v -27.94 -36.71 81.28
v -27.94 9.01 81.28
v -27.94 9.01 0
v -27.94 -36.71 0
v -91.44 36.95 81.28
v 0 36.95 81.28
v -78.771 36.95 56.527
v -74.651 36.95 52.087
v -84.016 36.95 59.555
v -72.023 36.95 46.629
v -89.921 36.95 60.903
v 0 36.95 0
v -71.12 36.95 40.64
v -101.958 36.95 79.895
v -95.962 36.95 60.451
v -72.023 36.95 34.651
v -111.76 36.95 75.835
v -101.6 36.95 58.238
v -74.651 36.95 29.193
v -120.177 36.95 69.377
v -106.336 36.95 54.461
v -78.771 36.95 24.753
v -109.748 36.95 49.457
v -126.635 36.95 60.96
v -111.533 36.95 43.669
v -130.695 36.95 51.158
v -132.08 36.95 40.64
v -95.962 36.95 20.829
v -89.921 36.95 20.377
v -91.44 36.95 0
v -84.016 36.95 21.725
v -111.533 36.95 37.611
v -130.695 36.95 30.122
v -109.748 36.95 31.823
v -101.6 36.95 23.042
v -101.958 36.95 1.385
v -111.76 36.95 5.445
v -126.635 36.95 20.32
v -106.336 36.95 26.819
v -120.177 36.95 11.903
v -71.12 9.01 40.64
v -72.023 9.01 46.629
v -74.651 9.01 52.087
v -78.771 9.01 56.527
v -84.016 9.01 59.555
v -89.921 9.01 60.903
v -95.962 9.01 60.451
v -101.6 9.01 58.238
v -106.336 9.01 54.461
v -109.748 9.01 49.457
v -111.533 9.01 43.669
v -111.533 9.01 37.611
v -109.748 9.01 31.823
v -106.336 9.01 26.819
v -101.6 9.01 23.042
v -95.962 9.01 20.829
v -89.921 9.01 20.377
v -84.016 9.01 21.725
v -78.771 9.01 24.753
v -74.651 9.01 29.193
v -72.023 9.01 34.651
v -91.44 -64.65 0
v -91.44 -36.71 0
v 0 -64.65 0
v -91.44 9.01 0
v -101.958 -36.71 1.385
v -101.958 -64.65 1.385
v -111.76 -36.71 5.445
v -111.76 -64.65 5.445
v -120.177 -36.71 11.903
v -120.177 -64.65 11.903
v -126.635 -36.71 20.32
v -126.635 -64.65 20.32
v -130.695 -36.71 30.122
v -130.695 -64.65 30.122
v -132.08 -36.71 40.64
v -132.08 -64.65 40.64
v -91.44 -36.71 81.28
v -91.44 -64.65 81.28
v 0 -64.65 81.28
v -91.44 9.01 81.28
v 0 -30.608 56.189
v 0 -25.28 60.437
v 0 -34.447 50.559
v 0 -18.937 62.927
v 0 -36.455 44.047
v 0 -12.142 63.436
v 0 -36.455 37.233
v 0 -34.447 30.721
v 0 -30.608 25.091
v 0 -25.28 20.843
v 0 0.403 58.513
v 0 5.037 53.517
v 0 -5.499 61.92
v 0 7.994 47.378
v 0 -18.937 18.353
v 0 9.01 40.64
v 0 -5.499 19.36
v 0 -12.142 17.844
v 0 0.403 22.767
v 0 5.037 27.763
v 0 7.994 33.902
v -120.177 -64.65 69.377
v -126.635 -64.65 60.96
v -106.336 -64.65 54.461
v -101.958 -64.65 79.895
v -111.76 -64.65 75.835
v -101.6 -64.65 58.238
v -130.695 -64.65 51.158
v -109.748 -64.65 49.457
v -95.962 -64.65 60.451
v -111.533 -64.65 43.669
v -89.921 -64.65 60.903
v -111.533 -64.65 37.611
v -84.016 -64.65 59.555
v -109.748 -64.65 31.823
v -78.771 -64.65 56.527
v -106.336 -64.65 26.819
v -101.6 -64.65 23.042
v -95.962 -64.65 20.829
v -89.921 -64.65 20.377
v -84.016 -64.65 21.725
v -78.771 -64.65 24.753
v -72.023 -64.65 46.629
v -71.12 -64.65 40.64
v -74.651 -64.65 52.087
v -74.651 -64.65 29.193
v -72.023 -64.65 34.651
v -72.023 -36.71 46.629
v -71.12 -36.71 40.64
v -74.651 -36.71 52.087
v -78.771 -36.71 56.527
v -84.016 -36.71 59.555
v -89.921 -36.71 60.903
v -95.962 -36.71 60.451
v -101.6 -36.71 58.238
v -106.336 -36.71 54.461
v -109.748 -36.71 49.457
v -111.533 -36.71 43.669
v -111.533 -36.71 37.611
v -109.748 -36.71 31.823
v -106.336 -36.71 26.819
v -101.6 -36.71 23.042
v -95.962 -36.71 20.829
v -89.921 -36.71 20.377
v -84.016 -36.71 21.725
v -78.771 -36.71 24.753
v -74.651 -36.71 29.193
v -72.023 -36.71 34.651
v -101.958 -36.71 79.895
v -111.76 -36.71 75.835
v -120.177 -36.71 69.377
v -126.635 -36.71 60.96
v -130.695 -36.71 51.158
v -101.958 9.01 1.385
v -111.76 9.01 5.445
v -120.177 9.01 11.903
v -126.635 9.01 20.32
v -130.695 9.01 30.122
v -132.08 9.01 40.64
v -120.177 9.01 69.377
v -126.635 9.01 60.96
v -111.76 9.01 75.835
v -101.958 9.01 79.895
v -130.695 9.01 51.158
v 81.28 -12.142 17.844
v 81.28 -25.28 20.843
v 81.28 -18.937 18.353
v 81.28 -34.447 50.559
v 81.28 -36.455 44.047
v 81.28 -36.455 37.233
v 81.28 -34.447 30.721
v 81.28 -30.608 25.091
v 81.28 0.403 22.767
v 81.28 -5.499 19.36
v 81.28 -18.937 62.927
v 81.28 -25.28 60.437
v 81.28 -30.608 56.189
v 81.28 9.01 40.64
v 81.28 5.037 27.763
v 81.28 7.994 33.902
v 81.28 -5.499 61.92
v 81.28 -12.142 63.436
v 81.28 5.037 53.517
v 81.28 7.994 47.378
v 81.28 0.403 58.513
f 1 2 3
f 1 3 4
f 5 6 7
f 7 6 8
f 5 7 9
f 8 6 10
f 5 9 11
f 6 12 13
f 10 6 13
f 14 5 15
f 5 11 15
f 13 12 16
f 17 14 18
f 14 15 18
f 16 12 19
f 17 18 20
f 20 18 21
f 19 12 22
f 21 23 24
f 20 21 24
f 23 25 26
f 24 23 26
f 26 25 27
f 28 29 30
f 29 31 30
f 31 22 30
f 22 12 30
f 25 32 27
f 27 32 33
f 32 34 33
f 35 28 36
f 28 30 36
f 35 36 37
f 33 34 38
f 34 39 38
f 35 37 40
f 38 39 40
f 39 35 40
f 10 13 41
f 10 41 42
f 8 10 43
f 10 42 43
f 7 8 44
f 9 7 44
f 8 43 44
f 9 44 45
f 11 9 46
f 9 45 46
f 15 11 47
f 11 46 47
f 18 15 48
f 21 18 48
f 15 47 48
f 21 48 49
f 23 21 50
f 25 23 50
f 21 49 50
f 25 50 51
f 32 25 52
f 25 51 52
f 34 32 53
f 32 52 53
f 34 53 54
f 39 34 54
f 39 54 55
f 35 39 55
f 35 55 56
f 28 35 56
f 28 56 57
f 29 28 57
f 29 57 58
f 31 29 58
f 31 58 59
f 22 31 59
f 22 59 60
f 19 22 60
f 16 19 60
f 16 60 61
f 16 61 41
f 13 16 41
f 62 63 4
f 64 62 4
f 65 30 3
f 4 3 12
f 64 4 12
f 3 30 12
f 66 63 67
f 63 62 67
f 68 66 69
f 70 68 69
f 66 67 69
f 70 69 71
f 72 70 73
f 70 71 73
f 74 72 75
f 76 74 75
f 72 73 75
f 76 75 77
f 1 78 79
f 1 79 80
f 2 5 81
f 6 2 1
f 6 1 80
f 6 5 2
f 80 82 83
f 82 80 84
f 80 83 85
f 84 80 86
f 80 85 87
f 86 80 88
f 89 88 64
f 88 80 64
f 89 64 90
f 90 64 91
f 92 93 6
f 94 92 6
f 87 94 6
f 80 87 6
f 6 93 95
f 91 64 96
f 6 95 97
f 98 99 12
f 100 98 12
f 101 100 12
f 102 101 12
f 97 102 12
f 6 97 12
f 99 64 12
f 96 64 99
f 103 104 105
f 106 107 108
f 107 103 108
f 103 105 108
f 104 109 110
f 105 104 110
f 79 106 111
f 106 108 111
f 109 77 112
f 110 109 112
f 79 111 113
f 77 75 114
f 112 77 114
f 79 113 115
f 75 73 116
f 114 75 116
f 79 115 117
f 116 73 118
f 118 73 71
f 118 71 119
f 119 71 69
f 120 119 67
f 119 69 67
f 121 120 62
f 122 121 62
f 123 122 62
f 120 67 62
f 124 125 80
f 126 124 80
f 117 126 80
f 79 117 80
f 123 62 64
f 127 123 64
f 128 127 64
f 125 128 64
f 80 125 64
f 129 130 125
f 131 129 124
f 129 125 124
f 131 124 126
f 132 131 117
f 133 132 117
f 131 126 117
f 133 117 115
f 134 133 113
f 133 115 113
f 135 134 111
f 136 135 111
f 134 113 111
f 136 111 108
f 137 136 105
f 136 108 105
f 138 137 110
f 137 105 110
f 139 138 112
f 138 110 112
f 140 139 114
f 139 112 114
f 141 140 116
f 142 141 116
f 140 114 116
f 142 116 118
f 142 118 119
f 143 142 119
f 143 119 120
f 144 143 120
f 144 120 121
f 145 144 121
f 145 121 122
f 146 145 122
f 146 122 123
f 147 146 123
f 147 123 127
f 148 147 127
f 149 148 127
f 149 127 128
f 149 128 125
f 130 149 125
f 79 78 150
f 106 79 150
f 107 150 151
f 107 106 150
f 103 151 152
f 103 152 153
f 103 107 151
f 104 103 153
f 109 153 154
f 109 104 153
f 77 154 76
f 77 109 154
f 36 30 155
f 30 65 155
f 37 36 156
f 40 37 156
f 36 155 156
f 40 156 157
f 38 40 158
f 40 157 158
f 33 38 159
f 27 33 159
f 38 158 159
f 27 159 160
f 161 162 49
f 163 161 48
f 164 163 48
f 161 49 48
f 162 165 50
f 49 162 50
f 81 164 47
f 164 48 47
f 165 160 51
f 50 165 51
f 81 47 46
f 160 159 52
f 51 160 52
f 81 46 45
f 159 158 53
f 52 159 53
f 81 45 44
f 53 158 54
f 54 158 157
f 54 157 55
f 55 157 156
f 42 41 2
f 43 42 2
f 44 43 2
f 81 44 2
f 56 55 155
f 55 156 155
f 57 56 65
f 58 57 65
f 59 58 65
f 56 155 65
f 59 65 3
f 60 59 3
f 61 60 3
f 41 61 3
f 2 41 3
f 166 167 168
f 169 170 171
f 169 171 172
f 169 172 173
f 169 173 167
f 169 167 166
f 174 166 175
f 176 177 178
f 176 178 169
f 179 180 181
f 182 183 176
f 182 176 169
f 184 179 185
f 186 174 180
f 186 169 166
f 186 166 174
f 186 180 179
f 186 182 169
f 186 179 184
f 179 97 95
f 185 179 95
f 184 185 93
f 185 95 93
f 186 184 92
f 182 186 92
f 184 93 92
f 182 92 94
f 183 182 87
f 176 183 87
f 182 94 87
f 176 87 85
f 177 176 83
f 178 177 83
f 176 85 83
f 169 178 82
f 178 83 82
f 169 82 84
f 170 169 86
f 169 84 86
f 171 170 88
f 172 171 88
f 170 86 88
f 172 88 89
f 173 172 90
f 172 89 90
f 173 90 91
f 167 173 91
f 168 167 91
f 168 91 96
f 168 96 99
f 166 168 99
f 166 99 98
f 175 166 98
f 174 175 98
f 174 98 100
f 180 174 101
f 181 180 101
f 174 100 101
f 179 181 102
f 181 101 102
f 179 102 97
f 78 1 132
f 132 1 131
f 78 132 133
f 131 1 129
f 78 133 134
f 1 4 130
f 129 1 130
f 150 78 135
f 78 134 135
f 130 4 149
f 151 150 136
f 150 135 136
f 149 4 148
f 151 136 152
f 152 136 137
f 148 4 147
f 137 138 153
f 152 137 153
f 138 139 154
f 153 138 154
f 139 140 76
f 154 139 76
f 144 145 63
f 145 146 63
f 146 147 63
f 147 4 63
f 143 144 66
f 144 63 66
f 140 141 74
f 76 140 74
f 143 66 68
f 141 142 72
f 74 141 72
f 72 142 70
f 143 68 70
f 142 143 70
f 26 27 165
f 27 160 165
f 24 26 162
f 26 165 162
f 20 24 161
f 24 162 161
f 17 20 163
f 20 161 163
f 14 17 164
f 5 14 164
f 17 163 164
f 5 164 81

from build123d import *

# Parameters (mm, degrees)
F1_DEPTH = 81.28
F2_R     = 20.32
F3_DEPTH = 101.6
F4_R     = 40.63999
F5_R     = 40.63999
F6_R     = 22.86
F7_DEPTH = 81.28


# Not quite as in the source:
# - a fillet or chamfer is up to 0.001 mm smaller than in the source, because OpenCascade refuses the exact size


with BuildPart() as f1:
    # F0 (on Top) → F1 (new body)
    with BuildSketch(Plane.XY):
        Polygon((0, -36.7104701635), (0, 0), (0, 9.0095298365), (0, 36.9495298365), (-132.08, 36.9495298365), (-132.08, 9.0095298365), (-27.94, 9.0095298365), (-27.94, -36.7104701635), (-132.08, -36.7104701635), (-132.08, -64.6504701635), (0, -64.6504701635), align=None)
    extrude(amount=F1_DEPTH)

    # F2 (on face) → F3 (cut)
    with BuildSketch(Plane.XZ.offset(64.6504701635)):
        with Locations((-91.44, 40.64)):
            Circle(F2_R)
    extrude(amount=-F3_DEPTH, mode=Mode.SUBTRACT)

    # F4 (radius 40.64 in the source; OpenCascade refuses exactly that, so slightly less here)
    f4_edges = [f1.edges().sort_by_distance(p)[0] for p in [
        (-132.08, -50.68047, 81.28),
        (-132.08, -50.68047, 0),
    ]]
    fillet(f4_edges, radius=F4_R)

    # F5 (radius 40.64 in the source; OpenCascade refuses exactly that, so slightly less here)
    f5_edges = [f1.edges().sort_by_distance(p)[0] for p in [
        (-132.08, 22.97953, 81.28),
        (-132.08, 22.97953, 0),
    ]]
    fillet(f5_edges, radius=F5_R)

    # F6 (on face) → F7 (join)
    with BuildSketch(Plane.YZ):
        with Locations((-13.8504701635, 40.64)):
            Circle(F6_R)
    extrude(amount=F7_DEPTH)


solid = f1.part
